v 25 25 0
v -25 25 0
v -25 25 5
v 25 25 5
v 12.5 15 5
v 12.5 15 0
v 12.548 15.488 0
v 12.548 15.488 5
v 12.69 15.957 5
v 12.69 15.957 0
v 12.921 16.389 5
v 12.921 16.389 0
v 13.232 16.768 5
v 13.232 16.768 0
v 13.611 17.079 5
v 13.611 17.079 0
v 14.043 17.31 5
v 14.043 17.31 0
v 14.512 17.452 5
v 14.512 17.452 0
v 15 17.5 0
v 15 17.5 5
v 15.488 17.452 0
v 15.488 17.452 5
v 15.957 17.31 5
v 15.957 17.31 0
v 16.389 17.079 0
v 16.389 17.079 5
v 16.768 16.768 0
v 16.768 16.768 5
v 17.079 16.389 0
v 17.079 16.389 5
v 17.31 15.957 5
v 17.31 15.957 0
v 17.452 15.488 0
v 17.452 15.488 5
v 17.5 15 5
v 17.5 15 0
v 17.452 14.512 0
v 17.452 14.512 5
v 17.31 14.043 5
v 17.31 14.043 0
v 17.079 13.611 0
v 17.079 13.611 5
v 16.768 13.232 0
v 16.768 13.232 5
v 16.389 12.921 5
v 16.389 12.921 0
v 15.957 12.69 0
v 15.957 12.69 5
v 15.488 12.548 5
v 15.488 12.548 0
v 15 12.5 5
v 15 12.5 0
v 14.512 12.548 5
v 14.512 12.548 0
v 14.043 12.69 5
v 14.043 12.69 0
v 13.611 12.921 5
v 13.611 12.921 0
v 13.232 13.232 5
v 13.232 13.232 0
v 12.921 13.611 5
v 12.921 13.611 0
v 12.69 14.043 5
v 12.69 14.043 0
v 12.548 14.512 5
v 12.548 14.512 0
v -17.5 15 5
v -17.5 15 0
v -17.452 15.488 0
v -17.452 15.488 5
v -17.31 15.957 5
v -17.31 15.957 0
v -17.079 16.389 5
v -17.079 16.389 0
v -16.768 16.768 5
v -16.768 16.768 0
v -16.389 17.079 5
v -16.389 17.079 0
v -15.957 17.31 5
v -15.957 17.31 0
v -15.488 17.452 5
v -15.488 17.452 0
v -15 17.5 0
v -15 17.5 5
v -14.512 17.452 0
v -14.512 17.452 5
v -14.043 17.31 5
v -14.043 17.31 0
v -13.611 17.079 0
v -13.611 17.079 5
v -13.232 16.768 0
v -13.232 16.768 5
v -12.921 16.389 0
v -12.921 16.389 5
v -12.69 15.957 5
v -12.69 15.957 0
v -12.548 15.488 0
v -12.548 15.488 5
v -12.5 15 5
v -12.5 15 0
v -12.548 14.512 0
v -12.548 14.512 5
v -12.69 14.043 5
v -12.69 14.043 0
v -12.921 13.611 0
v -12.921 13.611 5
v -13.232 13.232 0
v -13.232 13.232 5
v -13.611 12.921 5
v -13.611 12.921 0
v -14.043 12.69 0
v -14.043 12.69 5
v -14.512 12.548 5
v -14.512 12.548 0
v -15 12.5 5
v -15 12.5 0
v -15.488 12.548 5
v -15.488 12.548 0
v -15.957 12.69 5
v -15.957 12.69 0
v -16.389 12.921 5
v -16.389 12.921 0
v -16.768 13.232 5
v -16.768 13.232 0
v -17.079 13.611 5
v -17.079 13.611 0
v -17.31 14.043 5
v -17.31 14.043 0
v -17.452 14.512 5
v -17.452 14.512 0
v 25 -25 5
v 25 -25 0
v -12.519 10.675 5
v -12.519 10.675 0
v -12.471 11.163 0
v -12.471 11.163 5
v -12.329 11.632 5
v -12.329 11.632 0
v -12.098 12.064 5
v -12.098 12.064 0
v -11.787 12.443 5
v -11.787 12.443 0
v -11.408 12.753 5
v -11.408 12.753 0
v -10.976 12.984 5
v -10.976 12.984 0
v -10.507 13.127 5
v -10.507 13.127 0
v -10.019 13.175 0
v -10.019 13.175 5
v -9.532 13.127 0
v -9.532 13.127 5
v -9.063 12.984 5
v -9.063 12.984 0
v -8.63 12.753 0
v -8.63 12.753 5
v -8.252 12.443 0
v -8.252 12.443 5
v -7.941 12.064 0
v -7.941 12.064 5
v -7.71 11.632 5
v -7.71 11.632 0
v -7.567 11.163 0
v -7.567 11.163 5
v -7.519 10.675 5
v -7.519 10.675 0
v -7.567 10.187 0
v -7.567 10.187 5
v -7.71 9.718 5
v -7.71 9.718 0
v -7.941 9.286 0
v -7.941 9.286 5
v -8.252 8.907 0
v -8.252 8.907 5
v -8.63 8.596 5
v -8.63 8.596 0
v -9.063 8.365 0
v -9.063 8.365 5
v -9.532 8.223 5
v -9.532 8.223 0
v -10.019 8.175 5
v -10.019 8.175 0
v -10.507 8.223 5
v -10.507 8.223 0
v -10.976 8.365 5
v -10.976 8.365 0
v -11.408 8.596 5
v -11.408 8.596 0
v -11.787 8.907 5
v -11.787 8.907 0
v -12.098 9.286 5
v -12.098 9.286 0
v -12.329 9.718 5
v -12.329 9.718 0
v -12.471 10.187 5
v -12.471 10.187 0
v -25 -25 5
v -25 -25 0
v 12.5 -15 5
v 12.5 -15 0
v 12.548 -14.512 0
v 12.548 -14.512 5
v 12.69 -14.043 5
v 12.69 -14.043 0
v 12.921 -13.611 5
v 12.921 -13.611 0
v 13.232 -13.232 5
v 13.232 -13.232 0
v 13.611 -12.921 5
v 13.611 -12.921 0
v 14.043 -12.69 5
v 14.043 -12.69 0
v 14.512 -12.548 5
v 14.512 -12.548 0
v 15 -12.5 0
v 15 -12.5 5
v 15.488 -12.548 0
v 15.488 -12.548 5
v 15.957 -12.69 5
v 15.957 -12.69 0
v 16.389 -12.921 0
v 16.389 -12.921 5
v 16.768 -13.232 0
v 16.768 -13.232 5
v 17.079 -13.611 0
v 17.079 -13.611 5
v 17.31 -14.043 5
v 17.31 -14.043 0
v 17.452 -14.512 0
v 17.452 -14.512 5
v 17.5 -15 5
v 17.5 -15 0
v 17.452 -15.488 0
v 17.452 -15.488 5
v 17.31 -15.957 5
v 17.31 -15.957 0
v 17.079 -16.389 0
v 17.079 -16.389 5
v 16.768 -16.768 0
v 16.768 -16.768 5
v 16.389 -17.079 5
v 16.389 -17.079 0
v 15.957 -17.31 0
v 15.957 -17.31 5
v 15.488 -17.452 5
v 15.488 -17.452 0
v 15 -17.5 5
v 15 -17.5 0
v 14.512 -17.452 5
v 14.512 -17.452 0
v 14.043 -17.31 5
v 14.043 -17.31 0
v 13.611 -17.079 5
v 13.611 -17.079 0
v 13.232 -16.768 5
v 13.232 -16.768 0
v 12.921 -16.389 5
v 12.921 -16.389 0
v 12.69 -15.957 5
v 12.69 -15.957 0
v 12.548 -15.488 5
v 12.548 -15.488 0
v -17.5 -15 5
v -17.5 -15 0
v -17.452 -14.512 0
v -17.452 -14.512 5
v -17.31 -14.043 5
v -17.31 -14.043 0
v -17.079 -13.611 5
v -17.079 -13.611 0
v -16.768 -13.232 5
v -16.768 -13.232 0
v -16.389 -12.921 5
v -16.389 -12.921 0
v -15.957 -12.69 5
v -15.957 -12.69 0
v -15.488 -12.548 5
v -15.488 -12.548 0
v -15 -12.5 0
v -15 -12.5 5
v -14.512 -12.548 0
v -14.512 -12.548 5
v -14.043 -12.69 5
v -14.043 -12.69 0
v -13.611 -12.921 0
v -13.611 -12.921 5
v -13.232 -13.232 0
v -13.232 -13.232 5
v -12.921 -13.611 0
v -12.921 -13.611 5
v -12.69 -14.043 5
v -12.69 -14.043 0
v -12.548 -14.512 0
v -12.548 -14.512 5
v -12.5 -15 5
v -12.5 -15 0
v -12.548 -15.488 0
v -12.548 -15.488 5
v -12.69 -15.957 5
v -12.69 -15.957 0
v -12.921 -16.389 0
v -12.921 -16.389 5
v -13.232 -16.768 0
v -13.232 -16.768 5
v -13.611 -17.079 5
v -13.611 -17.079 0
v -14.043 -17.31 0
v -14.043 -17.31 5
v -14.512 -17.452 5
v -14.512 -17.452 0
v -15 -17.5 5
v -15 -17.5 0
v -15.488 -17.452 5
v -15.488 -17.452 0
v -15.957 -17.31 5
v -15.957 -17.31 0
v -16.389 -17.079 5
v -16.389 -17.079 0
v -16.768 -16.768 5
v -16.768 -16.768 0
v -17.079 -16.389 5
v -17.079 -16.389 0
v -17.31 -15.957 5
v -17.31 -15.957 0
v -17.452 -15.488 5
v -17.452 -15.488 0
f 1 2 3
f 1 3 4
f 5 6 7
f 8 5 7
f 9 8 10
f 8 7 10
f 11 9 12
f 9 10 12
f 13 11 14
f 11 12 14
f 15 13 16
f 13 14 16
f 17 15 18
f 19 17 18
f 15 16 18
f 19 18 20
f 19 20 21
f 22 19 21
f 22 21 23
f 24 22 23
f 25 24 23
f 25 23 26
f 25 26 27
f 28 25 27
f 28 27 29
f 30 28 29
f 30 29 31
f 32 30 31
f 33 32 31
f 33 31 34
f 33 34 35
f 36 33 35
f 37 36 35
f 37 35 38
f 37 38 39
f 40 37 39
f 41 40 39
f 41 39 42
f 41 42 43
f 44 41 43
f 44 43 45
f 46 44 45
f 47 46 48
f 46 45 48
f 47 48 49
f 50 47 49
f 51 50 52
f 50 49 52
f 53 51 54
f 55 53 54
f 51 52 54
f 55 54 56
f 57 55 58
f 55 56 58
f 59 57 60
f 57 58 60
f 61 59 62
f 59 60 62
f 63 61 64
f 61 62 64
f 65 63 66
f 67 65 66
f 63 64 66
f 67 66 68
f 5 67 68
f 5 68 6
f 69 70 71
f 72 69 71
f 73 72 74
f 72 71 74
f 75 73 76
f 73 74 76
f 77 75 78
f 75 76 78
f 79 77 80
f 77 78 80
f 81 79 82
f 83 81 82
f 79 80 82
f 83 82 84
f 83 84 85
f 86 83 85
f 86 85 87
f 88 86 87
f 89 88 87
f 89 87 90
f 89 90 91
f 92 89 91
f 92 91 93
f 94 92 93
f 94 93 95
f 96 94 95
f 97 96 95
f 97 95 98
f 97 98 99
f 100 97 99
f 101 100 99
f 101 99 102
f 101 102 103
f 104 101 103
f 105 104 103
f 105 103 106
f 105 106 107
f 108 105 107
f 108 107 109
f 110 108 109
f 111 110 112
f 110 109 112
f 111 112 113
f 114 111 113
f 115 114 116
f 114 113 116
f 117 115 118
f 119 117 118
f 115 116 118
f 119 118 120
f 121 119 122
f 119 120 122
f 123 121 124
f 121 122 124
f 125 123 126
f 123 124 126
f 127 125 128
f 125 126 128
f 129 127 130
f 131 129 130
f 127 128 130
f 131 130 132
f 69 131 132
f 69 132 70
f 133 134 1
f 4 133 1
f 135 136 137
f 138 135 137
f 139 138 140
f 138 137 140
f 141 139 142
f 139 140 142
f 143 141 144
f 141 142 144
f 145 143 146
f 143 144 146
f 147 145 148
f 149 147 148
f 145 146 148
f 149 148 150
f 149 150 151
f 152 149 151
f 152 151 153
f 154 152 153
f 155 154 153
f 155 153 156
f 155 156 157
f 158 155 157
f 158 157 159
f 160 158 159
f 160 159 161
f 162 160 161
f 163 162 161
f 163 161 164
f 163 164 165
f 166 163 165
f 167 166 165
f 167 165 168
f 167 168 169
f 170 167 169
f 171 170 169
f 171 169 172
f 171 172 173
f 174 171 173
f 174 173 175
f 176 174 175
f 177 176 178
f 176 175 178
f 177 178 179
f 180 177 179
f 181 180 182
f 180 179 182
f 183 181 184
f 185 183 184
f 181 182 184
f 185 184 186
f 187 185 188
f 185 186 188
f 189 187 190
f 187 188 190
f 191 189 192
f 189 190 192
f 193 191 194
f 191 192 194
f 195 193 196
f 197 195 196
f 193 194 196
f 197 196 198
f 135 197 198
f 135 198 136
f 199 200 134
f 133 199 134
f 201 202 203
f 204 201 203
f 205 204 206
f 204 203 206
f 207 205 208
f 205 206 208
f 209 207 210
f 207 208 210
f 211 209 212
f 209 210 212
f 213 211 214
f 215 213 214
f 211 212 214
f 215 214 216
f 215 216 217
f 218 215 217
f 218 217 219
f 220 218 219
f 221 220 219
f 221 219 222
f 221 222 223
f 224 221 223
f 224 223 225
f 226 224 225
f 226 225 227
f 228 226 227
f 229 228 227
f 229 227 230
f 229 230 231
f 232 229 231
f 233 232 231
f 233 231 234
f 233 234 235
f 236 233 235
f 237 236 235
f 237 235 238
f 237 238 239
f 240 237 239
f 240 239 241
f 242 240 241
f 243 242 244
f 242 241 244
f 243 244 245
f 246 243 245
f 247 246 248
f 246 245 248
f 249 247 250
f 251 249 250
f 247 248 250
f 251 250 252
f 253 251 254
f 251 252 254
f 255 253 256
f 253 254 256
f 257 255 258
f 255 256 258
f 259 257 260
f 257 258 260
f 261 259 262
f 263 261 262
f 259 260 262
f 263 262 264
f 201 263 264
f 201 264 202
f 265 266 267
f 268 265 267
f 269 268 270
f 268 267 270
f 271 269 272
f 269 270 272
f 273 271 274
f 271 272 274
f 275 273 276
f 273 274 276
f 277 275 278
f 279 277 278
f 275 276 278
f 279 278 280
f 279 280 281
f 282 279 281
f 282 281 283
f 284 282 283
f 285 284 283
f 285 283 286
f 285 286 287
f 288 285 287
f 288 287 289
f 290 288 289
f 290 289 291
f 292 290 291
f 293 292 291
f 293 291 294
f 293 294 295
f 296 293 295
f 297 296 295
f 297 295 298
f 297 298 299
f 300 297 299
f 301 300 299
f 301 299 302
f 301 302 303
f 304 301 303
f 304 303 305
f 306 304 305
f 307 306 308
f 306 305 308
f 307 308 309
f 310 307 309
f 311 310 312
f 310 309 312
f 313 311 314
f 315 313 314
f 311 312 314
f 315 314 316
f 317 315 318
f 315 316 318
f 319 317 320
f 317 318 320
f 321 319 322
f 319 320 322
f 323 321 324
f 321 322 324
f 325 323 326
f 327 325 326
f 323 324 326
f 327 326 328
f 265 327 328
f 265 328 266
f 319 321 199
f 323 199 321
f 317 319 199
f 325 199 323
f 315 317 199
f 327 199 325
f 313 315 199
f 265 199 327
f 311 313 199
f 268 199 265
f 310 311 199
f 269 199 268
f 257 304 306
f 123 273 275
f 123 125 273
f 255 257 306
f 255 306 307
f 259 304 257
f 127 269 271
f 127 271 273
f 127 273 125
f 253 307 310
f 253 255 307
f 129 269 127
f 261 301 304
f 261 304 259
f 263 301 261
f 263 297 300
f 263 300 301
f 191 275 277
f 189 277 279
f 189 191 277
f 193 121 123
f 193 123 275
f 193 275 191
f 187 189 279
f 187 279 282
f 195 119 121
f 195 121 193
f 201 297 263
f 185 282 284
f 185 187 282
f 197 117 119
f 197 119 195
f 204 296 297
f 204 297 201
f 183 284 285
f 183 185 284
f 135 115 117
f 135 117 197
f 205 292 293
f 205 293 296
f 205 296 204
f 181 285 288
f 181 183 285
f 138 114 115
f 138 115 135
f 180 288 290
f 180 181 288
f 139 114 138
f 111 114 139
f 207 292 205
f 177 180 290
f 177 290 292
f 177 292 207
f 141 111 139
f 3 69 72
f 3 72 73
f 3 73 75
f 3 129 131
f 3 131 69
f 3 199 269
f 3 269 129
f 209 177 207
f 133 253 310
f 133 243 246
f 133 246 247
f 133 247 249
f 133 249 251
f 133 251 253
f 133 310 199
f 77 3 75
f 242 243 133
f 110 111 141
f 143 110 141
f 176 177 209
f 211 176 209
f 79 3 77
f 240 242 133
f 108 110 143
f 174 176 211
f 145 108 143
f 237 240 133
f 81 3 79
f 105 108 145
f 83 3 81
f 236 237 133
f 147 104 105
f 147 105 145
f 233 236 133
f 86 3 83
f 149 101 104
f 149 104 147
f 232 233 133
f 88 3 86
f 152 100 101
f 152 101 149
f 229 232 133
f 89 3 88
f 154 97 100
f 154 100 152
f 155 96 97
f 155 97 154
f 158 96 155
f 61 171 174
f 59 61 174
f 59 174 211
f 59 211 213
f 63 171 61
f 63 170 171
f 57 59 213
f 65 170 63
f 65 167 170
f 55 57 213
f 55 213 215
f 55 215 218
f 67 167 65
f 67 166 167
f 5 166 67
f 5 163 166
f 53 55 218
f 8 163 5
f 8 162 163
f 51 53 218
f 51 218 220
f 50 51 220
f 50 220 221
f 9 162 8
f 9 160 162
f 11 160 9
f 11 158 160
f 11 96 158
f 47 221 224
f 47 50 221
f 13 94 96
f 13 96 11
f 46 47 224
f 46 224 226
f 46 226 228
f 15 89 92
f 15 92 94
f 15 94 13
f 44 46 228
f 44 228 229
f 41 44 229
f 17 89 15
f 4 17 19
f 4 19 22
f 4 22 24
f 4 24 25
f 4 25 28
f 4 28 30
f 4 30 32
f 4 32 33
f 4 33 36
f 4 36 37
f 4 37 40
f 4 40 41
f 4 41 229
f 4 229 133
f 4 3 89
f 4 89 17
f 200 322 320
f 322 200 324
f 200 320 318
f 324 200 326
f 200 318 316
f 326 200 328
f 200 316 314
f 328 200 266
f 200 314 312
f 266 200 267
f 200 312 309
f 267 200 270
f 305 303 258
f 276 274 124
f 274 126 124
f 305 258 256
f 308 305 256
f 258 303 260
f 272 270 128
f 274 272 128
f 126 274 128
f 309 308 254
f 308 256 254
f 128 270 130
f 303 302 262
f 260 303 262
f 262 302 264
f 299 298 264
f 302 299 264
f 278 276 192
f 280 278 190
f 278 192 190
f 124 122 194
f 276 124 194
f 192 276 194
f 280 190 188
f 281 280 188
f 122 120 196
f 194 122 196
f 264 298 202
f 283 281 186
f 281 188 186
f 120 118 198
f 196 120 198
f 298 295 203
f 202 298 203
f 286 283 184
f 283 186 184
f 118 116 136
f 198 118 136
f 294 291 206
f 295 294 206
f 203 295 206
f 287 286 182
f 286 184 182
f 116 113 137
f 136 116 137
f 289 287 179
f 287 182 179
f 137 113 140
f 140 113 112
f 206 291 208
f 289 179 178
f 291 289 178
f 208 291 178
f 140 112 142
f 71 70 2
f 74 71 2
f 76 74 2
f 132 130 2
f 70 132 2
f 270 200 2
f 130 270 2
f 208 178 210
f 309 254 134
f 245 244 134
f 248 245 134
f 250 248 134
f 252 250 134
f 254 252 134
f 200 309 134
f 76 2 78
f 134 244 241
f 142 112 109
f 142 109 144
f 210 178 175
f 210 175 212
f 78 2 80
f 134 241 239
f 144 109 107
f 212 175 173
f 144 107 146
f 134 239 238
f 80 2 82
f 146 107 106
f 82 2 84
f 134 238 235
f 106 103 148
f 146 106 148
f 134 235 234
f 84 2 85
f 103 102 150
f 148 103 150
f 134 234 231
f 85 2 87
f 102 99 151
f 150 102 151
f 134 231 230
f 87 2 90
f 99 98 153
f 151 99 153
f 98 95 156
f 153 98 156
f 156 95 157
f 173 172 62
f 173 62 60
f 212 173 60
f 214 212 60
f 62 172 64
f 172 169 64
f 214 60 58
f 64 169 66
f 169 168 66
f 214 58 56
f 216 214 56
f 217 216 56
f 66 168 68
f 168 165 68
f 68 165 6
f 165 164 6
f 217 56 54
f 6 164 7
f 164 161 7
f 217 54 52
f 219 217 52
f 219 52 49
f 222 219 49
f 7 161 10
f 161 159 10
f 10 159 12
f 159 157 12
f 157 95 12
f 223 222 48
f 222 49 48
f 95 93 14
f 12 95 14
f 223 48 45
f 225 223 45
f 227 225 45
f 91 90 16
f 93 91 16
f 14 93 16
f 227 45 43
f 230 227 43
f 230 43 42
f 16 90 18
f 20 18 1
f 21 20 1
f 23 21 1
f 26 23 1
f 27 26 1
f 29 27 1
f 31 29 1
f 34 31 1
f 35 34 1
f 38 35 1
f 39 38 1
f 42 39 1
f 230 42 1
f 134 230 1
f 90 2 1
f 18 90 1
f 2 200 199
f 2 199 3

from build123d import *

# Parameters (mm, degrees)
F0_W     = 50
F0_H     = 50
F1_DEPTH = 5
F3_D     = 5
F5_D     = 5


with BuildPart() as f1:
    # F0 (on Top) → F1 (new body)
    with BuildSketch(Plane.XY):
        Rectangle(F0_W, F0_H)
    extrude(amount=F1_DEPTH)

    # F3 (through all)
    with Locations(Plane.XY.offset(5)):
        with Locations((-10.019323, 10.674792)):
            Hole(F3_D / 2)

    # F5 (through all)
    with Locations(Plane.XY.offset(5)):
        with Locations((-15, 15), (15, 15), (15, -15), (-15, -15)):
            Hole(F5_D / 2)


solid = f1.part
